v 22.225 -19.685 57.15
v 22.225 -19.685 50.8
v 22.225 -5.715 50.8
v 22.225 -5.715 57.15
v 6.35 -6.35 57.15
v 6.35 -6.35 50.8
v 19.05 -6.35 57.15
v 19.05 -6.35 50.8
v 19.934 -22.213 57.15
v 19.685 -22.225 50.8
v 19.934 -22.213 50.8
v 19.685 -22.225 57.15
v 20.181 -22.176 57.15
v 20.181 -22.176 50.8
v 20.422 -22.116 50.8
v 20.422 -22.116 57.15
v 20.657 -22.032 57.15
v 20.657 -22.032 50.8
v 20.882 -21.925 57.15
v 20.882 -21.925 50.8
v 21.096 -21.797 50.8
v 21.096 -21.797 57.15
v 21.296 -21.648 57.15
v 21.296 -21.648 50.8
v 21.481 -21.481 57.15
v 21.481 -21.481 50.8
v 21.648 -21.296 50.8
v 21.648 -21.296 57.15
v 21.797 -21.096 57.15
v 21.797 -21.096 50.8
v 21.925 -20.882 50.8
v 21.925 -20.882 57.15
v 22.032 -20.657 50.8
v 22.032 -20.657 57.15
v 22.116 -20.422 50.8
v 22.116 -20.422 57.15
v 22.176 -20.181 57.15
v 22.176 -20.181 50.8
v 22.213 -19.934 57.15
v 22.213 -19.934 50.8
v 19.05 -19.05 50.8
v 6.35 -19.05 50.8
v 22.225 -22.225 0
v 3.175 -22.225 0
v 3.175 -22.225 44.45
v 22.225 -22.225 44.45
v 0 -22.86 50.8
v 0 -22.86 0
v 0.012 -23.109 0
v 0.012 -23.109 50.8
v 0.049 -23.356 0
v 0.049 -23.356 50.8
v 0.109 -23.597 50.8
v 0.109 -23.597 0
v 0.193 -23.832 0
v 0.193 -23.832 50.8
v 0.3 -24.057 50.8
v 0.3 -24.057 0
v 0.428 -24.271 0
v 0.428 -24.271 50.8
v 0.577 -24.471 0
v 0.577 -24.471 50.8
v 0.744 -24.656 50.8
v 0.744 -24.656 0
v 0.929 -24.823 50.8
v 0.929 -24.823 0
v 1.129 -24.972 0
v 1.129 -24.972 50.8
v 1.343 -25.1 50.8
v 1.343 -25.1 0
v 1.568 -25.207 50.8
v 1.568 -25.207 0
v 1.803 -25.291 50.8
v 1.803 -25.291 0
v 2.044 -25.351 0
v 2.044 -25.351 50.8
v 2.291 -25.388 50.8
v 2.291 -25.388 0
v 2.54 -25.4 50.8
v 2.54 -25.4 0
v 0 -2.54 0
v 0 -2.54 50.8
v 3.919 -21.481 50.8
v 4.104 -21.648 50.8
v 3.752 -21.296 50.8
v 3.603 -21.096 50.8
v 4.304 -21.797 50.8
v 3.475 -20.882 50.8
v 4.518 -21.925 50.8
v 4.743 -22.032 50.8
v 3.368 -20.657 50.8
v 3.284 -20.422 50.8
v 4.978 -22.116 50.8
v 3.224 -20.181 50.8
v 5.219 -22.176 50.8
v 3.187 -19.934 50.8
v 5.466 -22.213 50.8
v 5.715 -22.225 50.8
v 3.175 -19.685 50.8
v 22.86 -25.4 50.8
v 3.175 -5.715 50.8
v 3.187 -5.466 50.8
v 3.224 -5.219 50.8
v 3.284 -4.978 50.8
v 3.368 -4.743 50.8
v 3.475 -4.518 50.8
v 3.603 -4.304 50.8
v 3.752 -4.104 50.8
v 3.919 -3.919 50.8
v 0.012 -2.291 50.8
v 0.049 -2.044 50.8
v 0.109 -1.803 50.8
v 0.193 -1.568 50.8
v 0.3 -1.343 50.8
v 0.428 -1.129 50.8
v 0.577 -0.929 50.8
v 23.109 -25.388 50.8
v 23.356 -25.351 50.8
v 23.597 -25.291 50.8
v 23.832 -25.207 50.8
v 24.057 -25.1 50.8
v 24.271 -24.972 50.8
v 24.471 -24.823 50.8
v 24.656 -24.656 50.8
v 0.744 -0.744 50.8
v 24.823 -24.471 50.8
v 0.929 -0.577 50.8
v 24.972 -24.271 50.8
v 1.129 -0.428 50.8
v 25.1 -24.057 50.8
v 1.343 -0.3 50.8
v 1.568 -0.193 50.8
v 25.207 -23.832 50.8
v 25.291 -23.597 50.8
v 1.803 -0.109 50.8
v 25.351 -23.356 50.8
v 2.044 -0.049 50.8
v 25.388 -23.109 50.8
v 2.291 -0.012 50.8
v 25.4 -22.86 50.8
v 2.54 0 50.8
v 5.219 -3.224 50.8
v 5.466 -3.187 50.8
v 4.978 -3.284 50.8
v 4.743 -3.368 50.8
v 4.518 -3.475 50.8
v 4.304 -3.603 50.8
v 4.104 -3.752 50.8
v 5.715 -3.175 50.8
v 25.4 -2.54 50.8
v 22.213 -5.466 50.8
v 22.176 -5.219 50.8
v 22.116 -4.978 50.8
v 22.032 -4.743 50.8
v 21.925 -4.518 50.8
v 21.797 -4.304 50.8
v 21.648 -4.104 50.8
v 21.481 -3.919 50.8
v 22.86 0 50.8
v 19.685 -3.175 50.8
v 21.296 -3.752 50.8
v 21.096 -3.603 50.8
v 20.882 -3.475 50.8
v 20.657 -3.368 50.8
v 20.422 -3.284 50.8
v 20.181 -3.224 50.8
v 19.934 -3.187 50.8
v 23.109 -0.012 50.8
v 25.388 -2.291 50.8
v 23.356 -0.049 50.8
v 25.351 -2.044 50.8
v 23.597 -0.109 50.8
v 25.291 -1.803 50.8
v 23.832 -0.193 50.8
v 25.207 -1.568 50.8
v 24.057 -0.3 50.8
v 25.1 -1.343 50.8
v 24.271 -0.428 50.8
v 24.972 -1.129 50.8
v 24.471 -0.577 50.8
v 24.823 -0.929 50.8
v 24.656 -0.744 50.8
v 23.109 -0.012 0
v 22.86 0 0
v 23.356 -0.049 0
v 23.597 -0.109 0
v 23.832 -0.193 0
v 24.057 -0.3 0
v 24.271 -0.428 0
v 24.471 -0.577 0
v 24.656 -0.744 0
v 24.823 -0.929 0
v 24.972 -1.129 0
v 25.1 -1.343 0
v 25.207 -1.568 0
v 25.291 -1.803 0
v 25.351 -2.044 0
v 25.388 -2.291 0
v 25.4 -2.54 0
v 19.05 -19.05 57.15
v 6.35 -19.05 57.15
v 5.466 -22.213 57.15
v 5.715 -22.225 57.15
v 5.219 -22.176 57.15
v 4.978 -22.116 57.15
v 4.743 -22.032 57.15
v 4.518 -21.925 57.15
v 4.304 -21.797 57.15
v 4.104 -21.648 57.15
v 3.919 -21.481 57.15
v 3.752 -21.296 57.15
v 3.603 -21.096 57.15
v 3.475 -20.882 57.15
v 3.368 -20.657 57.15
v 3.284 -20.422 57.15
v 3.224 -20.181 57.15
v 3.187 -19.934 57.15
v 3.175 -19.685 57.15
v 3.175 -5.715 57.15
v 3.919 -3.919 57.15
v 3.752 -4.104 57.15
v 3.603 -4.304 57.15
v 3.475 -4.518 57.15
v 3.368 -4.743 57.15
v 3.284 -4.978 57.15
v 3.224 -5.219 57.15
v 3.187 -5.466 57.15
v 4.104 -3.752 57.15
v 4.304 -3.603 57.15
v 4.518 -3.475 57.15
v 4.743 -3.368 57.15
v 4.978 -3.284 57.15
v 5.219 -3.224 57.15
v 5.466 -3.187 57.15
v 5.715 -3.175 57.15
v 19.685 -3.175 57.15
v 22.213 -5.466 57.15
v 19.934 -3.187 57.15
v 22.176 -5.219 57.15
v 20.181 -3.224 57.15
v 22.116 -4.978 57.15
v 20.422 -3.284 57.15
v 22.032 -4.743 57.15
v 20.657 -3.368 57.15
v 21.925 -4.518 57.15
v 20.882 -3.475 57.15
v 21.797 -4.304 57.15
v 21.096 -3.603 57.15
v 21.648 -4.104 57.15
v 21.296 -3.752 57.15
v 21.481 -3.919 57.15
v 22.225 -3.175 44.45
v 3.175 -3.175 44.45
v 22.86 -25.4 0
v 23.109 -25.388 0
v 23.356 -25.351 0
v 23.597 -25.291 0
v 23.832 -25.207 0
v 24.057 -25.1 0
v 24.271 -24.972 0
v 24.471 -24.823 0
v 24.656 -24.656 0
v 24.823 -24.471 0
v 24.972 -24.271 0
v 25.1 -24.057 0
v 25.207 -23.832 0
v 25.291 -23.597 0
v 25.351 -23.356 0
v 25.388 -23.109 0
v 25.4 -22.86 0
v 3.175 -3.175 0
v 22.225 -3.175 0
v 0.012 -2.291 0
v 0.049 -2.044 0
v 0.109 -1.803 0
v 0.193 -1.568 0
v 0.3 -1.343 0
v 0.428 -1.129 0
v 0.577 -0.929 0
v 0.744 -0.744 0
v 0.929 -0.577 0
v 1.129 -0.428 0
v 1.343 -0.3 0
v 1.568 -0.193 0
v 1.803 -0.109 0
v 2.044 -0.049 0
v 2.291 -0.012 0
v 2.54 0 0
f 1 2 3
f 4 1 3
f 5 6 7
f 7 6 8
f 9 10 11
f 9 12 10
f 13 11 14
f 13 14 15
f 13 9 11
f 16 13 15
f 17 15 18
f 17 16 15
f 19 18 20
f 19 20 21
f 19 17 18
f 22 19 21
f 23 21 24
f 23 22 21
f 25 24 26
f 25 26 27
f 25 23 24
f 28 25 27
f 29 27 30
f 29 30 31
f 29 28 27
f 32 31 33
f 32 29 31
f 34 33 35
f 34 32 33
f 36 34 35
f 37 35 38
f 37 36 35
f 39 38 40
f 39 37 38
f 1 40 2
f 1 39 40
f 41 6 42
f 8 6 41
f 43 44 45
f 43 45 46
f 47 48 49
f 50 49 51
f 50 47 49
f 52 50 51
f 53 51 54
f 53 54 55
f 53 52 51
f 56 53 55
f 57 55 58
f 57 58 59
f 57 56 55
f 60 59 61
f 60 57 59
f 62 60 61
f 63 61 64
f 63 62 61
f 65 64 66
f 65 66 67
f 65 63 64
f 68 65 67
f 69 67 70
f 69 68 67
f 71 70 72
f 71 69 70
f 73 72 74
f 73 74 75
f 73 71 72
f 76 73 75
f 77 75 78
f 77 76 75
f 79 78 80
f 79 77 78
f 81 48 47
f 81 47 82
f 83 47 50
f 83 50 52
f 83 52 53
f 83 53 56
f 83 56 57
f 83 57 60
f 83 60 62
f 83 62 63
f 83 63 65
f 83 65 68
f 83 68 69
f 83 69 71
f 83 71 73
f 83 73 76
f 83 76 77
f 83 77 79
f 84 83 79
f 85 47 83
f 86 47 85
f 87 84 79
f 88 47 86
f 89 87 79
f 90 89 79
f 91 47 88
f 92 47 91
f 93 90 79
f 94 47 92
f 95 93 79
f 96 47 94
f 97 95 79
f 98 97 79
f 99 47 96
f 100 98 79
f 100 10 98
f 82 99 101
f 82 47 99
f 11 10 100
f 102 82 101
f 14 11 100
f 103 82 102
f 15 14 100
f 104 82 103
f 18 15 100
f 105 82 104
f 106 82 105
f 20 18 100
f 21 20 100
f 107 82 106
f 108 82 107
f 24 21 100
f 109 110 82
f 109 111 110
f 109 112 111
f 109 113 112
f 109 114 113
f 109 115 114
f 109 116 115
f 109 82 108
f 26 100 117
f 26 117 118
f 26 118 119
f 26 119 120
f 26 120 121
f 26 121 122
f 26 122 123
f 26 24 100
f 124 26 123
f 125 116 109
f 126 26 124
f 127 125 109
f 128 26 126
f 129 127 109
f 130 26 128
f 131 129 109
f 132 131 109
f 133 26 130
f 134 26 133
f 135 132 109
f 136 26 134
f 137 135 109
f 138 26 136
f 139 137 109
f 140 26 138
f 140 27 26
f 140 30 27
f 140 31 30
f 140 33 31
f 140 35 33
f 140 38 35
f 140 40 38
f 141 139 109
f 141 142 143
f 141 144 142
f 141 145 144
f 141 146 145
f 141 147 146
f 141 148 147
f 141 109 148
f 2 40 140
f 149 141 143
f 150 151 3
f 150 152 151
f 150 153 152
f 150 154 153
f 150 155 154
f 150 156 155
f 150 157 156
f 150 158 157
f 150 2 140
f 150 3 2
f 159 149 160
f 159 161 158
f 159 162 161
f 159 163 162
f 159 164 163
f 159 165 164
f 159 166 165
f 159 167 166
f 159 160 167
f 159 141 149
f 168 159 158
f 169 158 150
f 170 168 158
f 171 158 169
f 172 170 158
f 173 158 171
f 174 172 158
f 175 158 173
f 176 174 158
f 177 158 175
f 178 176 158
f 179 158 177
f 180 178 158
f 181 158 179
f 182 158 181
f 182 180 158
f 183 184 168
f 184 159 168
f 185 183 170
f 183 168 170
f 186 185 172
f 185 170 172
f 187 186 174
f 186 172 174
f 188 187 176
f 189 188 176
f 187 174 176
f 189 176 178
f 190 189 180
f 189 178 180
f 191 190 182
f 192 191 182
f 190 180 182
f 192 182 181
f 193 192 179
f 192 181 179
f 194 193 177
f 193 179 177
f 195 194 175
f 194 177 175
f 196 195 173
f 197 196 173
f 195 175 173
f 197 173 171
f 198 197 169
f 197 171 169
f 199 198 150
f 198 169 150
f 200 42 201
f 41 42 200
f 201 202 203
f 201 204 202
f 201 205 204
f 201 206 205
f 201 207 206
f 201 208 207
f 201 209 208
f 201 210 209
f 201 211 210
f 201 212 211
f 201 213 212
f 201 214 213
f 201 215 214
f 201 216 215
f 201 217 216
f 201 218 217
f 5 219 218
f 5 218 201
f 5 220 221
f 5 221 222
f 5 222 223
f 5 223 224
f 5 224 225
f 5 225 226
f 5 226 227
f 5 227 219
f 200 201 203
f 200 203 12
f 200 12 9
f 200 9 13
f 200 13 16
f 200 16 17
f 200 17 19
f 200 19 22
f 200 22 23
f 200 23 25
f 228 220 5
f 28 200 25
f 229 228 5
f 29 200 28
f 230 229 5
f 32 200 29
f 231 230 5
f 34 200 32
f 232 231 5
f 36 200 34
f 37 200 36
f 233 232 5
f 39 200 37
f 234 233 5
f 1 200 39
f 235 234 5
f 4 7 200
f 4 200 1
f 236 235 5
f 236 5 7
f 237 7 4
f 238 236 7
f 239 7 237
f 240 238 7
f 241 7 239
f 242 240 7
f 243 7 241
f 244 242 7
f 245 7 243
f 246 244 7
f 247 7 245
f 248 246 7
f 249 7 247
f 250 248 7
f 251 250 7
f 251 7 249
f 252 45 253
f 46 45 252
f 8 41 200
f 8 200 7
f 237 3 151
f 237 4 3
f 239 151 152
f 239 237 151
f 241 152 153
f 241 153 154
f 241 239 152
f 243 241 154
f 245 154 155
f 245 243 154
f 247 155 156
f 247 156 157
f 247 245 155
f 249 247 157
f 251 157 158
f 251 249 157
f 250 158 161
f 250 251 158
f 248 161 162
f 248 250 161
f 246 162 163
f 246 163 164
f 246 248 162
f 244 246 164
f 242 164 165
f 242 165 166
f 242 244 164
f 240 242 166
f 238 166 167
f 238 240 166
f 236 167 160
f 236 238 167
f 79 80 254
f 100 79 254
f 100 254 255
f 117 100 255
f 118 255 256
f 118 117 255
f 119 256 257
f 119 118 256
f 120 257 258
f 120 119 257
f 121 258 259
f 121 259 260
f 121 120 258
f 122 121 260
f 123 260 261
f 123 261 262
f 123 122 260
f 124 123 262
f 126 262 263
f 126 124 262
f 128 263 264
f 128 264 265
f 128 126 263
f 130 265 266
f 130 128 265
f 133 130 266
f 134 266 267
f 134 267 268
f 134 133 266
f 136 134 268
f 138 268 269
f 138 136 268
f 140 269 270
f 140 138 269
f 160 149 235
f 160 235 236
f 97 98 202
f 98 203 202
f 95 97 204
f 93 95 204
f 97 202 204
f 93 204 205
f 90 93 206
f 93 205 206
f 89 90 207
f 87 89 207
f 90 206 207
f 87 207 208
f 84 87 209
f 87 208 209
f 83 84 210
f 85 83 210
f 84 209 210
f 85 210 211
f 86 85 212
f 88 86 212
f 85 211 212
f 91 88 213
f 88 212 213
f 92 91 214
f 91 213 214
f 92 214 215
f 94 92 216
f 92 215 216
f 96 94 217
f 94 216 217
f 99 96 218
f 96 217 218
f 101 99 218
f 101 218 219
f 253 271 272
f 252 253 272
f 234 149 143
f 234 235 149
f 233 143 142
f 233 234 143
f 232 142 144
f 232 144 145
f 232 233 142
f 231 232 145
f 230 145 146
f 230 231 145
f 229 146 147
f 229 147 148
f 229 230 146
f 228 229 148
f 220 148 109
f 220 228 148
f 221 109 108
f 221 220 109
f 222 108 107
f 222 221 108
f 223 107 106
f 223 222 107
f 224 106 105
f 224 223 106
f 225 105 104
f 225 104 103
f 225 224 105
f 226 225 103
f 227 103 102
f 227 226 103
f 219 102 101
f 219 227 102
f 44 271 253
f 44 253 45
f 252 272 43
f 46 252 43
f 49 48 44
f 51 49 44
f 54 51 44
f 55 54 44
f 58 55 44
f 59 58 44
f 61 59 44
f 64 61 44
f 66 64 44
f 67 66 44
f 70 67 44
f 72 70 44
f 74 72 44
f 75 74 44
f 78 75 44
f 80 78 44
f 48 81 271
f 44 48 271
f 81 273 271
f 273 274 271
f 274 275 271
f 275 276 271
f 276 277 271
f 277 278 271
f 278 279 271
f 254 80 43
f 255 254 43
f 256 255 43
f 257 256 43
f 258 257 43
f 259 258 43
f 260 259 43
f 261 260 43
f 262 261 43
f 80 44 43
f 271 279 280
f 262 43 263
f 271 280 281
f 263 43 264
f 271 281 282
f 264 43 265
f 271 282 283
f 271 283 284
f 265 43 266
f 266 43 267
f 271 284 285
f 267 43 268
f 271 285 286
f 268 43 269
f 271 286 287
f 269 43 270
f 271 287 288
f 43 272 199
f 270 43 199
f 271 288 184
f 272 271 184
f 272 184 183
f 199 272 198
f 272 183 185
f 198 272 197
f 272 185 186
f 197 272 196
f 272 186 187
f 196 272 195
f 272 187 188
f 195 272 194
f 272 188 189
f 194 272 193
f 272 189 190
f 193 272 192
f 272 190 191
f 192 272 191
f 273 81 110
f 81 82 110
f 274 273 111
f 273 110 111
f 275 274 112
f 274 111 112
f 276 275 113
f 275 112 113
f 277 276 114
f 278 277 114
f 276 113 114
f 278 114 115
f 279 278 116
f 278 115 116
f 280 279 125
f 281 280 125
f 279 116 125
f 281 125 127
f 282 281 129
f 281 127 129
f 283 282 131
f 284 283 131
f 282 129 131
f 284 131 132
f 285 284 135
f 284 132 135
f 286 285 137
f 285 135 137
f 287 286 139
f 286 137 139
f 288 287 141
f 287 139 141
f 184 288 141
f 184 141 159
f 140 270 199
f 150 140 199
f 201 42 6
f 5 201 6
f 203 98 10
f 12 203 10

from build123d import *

# Parameters (mm, degrees)
F0_W     = 25.4
F0_H     = 25.4
F1_DEPTH = 50.8
F2_W     = 19.05
F2_H     = 19.05
F3_DEPTH = 44.45
F4_W     = 19.05
F4_H     = 19.05
F4_W_2   = 12.7
F4_H_2   = 12.7
F5_DEPTH = 6.35
F6_R     = 2.54


# Not quite as in the source:
# - a feature names something its author has since deleted; it is built from what else it names


with BuildPart() as f1:
    # F0 (on Top) → F1 (new body)
    with BuildSketch(Plane.XY):
        with Locations((12.7, -12.7)):
            Rectangle(F0_W, F0_H)
    extrude(amount=F1_DEPTH)

    # F2 (on face) → F3 (cut)
    with BuildSketch(Plane(origin=(0, 0, 0), x_dir=(1, 0, 0), z_dir=(0, 0, -1))):
        with Locations((12.7, 12.7)):
            Rectangle(F2_W, F2_H)
    extrude(amount=-F3_DEPTH, mode=Mode.SUBTRACT)

    # F4 (on face) → F5 (join)
    with BuildSketch(Plane.XY.offset(50.8)):
        with Locations((12.7, -12.7)):
            Rectangle(F4_W, F4_H)
        with Locations((12.7, -12.7)):
            Rectangle(F4_W_2, F4_H_2, mode=Mode.SUBTRACT)
    extrude(amount=F5_DEPTH)

    # F6
    f6_edges = [f1.edges().sort_by_distance(p)[0] for p in [
        (0, 0, 25.4),
        (0, -25.4, 25.4),
        (25.4, 0, 25.4),
        (3.175, -3.175, 53.975),
        (3.175, -22.225, 53.975),
        (22.225, -3.175, 53.975),
        (22.225, -22.225, 53.975),
        (25.4, -25.4, 25.4),
    ]]
    fillet(f6_edges, radius=F6_R)


solid = f1.part
